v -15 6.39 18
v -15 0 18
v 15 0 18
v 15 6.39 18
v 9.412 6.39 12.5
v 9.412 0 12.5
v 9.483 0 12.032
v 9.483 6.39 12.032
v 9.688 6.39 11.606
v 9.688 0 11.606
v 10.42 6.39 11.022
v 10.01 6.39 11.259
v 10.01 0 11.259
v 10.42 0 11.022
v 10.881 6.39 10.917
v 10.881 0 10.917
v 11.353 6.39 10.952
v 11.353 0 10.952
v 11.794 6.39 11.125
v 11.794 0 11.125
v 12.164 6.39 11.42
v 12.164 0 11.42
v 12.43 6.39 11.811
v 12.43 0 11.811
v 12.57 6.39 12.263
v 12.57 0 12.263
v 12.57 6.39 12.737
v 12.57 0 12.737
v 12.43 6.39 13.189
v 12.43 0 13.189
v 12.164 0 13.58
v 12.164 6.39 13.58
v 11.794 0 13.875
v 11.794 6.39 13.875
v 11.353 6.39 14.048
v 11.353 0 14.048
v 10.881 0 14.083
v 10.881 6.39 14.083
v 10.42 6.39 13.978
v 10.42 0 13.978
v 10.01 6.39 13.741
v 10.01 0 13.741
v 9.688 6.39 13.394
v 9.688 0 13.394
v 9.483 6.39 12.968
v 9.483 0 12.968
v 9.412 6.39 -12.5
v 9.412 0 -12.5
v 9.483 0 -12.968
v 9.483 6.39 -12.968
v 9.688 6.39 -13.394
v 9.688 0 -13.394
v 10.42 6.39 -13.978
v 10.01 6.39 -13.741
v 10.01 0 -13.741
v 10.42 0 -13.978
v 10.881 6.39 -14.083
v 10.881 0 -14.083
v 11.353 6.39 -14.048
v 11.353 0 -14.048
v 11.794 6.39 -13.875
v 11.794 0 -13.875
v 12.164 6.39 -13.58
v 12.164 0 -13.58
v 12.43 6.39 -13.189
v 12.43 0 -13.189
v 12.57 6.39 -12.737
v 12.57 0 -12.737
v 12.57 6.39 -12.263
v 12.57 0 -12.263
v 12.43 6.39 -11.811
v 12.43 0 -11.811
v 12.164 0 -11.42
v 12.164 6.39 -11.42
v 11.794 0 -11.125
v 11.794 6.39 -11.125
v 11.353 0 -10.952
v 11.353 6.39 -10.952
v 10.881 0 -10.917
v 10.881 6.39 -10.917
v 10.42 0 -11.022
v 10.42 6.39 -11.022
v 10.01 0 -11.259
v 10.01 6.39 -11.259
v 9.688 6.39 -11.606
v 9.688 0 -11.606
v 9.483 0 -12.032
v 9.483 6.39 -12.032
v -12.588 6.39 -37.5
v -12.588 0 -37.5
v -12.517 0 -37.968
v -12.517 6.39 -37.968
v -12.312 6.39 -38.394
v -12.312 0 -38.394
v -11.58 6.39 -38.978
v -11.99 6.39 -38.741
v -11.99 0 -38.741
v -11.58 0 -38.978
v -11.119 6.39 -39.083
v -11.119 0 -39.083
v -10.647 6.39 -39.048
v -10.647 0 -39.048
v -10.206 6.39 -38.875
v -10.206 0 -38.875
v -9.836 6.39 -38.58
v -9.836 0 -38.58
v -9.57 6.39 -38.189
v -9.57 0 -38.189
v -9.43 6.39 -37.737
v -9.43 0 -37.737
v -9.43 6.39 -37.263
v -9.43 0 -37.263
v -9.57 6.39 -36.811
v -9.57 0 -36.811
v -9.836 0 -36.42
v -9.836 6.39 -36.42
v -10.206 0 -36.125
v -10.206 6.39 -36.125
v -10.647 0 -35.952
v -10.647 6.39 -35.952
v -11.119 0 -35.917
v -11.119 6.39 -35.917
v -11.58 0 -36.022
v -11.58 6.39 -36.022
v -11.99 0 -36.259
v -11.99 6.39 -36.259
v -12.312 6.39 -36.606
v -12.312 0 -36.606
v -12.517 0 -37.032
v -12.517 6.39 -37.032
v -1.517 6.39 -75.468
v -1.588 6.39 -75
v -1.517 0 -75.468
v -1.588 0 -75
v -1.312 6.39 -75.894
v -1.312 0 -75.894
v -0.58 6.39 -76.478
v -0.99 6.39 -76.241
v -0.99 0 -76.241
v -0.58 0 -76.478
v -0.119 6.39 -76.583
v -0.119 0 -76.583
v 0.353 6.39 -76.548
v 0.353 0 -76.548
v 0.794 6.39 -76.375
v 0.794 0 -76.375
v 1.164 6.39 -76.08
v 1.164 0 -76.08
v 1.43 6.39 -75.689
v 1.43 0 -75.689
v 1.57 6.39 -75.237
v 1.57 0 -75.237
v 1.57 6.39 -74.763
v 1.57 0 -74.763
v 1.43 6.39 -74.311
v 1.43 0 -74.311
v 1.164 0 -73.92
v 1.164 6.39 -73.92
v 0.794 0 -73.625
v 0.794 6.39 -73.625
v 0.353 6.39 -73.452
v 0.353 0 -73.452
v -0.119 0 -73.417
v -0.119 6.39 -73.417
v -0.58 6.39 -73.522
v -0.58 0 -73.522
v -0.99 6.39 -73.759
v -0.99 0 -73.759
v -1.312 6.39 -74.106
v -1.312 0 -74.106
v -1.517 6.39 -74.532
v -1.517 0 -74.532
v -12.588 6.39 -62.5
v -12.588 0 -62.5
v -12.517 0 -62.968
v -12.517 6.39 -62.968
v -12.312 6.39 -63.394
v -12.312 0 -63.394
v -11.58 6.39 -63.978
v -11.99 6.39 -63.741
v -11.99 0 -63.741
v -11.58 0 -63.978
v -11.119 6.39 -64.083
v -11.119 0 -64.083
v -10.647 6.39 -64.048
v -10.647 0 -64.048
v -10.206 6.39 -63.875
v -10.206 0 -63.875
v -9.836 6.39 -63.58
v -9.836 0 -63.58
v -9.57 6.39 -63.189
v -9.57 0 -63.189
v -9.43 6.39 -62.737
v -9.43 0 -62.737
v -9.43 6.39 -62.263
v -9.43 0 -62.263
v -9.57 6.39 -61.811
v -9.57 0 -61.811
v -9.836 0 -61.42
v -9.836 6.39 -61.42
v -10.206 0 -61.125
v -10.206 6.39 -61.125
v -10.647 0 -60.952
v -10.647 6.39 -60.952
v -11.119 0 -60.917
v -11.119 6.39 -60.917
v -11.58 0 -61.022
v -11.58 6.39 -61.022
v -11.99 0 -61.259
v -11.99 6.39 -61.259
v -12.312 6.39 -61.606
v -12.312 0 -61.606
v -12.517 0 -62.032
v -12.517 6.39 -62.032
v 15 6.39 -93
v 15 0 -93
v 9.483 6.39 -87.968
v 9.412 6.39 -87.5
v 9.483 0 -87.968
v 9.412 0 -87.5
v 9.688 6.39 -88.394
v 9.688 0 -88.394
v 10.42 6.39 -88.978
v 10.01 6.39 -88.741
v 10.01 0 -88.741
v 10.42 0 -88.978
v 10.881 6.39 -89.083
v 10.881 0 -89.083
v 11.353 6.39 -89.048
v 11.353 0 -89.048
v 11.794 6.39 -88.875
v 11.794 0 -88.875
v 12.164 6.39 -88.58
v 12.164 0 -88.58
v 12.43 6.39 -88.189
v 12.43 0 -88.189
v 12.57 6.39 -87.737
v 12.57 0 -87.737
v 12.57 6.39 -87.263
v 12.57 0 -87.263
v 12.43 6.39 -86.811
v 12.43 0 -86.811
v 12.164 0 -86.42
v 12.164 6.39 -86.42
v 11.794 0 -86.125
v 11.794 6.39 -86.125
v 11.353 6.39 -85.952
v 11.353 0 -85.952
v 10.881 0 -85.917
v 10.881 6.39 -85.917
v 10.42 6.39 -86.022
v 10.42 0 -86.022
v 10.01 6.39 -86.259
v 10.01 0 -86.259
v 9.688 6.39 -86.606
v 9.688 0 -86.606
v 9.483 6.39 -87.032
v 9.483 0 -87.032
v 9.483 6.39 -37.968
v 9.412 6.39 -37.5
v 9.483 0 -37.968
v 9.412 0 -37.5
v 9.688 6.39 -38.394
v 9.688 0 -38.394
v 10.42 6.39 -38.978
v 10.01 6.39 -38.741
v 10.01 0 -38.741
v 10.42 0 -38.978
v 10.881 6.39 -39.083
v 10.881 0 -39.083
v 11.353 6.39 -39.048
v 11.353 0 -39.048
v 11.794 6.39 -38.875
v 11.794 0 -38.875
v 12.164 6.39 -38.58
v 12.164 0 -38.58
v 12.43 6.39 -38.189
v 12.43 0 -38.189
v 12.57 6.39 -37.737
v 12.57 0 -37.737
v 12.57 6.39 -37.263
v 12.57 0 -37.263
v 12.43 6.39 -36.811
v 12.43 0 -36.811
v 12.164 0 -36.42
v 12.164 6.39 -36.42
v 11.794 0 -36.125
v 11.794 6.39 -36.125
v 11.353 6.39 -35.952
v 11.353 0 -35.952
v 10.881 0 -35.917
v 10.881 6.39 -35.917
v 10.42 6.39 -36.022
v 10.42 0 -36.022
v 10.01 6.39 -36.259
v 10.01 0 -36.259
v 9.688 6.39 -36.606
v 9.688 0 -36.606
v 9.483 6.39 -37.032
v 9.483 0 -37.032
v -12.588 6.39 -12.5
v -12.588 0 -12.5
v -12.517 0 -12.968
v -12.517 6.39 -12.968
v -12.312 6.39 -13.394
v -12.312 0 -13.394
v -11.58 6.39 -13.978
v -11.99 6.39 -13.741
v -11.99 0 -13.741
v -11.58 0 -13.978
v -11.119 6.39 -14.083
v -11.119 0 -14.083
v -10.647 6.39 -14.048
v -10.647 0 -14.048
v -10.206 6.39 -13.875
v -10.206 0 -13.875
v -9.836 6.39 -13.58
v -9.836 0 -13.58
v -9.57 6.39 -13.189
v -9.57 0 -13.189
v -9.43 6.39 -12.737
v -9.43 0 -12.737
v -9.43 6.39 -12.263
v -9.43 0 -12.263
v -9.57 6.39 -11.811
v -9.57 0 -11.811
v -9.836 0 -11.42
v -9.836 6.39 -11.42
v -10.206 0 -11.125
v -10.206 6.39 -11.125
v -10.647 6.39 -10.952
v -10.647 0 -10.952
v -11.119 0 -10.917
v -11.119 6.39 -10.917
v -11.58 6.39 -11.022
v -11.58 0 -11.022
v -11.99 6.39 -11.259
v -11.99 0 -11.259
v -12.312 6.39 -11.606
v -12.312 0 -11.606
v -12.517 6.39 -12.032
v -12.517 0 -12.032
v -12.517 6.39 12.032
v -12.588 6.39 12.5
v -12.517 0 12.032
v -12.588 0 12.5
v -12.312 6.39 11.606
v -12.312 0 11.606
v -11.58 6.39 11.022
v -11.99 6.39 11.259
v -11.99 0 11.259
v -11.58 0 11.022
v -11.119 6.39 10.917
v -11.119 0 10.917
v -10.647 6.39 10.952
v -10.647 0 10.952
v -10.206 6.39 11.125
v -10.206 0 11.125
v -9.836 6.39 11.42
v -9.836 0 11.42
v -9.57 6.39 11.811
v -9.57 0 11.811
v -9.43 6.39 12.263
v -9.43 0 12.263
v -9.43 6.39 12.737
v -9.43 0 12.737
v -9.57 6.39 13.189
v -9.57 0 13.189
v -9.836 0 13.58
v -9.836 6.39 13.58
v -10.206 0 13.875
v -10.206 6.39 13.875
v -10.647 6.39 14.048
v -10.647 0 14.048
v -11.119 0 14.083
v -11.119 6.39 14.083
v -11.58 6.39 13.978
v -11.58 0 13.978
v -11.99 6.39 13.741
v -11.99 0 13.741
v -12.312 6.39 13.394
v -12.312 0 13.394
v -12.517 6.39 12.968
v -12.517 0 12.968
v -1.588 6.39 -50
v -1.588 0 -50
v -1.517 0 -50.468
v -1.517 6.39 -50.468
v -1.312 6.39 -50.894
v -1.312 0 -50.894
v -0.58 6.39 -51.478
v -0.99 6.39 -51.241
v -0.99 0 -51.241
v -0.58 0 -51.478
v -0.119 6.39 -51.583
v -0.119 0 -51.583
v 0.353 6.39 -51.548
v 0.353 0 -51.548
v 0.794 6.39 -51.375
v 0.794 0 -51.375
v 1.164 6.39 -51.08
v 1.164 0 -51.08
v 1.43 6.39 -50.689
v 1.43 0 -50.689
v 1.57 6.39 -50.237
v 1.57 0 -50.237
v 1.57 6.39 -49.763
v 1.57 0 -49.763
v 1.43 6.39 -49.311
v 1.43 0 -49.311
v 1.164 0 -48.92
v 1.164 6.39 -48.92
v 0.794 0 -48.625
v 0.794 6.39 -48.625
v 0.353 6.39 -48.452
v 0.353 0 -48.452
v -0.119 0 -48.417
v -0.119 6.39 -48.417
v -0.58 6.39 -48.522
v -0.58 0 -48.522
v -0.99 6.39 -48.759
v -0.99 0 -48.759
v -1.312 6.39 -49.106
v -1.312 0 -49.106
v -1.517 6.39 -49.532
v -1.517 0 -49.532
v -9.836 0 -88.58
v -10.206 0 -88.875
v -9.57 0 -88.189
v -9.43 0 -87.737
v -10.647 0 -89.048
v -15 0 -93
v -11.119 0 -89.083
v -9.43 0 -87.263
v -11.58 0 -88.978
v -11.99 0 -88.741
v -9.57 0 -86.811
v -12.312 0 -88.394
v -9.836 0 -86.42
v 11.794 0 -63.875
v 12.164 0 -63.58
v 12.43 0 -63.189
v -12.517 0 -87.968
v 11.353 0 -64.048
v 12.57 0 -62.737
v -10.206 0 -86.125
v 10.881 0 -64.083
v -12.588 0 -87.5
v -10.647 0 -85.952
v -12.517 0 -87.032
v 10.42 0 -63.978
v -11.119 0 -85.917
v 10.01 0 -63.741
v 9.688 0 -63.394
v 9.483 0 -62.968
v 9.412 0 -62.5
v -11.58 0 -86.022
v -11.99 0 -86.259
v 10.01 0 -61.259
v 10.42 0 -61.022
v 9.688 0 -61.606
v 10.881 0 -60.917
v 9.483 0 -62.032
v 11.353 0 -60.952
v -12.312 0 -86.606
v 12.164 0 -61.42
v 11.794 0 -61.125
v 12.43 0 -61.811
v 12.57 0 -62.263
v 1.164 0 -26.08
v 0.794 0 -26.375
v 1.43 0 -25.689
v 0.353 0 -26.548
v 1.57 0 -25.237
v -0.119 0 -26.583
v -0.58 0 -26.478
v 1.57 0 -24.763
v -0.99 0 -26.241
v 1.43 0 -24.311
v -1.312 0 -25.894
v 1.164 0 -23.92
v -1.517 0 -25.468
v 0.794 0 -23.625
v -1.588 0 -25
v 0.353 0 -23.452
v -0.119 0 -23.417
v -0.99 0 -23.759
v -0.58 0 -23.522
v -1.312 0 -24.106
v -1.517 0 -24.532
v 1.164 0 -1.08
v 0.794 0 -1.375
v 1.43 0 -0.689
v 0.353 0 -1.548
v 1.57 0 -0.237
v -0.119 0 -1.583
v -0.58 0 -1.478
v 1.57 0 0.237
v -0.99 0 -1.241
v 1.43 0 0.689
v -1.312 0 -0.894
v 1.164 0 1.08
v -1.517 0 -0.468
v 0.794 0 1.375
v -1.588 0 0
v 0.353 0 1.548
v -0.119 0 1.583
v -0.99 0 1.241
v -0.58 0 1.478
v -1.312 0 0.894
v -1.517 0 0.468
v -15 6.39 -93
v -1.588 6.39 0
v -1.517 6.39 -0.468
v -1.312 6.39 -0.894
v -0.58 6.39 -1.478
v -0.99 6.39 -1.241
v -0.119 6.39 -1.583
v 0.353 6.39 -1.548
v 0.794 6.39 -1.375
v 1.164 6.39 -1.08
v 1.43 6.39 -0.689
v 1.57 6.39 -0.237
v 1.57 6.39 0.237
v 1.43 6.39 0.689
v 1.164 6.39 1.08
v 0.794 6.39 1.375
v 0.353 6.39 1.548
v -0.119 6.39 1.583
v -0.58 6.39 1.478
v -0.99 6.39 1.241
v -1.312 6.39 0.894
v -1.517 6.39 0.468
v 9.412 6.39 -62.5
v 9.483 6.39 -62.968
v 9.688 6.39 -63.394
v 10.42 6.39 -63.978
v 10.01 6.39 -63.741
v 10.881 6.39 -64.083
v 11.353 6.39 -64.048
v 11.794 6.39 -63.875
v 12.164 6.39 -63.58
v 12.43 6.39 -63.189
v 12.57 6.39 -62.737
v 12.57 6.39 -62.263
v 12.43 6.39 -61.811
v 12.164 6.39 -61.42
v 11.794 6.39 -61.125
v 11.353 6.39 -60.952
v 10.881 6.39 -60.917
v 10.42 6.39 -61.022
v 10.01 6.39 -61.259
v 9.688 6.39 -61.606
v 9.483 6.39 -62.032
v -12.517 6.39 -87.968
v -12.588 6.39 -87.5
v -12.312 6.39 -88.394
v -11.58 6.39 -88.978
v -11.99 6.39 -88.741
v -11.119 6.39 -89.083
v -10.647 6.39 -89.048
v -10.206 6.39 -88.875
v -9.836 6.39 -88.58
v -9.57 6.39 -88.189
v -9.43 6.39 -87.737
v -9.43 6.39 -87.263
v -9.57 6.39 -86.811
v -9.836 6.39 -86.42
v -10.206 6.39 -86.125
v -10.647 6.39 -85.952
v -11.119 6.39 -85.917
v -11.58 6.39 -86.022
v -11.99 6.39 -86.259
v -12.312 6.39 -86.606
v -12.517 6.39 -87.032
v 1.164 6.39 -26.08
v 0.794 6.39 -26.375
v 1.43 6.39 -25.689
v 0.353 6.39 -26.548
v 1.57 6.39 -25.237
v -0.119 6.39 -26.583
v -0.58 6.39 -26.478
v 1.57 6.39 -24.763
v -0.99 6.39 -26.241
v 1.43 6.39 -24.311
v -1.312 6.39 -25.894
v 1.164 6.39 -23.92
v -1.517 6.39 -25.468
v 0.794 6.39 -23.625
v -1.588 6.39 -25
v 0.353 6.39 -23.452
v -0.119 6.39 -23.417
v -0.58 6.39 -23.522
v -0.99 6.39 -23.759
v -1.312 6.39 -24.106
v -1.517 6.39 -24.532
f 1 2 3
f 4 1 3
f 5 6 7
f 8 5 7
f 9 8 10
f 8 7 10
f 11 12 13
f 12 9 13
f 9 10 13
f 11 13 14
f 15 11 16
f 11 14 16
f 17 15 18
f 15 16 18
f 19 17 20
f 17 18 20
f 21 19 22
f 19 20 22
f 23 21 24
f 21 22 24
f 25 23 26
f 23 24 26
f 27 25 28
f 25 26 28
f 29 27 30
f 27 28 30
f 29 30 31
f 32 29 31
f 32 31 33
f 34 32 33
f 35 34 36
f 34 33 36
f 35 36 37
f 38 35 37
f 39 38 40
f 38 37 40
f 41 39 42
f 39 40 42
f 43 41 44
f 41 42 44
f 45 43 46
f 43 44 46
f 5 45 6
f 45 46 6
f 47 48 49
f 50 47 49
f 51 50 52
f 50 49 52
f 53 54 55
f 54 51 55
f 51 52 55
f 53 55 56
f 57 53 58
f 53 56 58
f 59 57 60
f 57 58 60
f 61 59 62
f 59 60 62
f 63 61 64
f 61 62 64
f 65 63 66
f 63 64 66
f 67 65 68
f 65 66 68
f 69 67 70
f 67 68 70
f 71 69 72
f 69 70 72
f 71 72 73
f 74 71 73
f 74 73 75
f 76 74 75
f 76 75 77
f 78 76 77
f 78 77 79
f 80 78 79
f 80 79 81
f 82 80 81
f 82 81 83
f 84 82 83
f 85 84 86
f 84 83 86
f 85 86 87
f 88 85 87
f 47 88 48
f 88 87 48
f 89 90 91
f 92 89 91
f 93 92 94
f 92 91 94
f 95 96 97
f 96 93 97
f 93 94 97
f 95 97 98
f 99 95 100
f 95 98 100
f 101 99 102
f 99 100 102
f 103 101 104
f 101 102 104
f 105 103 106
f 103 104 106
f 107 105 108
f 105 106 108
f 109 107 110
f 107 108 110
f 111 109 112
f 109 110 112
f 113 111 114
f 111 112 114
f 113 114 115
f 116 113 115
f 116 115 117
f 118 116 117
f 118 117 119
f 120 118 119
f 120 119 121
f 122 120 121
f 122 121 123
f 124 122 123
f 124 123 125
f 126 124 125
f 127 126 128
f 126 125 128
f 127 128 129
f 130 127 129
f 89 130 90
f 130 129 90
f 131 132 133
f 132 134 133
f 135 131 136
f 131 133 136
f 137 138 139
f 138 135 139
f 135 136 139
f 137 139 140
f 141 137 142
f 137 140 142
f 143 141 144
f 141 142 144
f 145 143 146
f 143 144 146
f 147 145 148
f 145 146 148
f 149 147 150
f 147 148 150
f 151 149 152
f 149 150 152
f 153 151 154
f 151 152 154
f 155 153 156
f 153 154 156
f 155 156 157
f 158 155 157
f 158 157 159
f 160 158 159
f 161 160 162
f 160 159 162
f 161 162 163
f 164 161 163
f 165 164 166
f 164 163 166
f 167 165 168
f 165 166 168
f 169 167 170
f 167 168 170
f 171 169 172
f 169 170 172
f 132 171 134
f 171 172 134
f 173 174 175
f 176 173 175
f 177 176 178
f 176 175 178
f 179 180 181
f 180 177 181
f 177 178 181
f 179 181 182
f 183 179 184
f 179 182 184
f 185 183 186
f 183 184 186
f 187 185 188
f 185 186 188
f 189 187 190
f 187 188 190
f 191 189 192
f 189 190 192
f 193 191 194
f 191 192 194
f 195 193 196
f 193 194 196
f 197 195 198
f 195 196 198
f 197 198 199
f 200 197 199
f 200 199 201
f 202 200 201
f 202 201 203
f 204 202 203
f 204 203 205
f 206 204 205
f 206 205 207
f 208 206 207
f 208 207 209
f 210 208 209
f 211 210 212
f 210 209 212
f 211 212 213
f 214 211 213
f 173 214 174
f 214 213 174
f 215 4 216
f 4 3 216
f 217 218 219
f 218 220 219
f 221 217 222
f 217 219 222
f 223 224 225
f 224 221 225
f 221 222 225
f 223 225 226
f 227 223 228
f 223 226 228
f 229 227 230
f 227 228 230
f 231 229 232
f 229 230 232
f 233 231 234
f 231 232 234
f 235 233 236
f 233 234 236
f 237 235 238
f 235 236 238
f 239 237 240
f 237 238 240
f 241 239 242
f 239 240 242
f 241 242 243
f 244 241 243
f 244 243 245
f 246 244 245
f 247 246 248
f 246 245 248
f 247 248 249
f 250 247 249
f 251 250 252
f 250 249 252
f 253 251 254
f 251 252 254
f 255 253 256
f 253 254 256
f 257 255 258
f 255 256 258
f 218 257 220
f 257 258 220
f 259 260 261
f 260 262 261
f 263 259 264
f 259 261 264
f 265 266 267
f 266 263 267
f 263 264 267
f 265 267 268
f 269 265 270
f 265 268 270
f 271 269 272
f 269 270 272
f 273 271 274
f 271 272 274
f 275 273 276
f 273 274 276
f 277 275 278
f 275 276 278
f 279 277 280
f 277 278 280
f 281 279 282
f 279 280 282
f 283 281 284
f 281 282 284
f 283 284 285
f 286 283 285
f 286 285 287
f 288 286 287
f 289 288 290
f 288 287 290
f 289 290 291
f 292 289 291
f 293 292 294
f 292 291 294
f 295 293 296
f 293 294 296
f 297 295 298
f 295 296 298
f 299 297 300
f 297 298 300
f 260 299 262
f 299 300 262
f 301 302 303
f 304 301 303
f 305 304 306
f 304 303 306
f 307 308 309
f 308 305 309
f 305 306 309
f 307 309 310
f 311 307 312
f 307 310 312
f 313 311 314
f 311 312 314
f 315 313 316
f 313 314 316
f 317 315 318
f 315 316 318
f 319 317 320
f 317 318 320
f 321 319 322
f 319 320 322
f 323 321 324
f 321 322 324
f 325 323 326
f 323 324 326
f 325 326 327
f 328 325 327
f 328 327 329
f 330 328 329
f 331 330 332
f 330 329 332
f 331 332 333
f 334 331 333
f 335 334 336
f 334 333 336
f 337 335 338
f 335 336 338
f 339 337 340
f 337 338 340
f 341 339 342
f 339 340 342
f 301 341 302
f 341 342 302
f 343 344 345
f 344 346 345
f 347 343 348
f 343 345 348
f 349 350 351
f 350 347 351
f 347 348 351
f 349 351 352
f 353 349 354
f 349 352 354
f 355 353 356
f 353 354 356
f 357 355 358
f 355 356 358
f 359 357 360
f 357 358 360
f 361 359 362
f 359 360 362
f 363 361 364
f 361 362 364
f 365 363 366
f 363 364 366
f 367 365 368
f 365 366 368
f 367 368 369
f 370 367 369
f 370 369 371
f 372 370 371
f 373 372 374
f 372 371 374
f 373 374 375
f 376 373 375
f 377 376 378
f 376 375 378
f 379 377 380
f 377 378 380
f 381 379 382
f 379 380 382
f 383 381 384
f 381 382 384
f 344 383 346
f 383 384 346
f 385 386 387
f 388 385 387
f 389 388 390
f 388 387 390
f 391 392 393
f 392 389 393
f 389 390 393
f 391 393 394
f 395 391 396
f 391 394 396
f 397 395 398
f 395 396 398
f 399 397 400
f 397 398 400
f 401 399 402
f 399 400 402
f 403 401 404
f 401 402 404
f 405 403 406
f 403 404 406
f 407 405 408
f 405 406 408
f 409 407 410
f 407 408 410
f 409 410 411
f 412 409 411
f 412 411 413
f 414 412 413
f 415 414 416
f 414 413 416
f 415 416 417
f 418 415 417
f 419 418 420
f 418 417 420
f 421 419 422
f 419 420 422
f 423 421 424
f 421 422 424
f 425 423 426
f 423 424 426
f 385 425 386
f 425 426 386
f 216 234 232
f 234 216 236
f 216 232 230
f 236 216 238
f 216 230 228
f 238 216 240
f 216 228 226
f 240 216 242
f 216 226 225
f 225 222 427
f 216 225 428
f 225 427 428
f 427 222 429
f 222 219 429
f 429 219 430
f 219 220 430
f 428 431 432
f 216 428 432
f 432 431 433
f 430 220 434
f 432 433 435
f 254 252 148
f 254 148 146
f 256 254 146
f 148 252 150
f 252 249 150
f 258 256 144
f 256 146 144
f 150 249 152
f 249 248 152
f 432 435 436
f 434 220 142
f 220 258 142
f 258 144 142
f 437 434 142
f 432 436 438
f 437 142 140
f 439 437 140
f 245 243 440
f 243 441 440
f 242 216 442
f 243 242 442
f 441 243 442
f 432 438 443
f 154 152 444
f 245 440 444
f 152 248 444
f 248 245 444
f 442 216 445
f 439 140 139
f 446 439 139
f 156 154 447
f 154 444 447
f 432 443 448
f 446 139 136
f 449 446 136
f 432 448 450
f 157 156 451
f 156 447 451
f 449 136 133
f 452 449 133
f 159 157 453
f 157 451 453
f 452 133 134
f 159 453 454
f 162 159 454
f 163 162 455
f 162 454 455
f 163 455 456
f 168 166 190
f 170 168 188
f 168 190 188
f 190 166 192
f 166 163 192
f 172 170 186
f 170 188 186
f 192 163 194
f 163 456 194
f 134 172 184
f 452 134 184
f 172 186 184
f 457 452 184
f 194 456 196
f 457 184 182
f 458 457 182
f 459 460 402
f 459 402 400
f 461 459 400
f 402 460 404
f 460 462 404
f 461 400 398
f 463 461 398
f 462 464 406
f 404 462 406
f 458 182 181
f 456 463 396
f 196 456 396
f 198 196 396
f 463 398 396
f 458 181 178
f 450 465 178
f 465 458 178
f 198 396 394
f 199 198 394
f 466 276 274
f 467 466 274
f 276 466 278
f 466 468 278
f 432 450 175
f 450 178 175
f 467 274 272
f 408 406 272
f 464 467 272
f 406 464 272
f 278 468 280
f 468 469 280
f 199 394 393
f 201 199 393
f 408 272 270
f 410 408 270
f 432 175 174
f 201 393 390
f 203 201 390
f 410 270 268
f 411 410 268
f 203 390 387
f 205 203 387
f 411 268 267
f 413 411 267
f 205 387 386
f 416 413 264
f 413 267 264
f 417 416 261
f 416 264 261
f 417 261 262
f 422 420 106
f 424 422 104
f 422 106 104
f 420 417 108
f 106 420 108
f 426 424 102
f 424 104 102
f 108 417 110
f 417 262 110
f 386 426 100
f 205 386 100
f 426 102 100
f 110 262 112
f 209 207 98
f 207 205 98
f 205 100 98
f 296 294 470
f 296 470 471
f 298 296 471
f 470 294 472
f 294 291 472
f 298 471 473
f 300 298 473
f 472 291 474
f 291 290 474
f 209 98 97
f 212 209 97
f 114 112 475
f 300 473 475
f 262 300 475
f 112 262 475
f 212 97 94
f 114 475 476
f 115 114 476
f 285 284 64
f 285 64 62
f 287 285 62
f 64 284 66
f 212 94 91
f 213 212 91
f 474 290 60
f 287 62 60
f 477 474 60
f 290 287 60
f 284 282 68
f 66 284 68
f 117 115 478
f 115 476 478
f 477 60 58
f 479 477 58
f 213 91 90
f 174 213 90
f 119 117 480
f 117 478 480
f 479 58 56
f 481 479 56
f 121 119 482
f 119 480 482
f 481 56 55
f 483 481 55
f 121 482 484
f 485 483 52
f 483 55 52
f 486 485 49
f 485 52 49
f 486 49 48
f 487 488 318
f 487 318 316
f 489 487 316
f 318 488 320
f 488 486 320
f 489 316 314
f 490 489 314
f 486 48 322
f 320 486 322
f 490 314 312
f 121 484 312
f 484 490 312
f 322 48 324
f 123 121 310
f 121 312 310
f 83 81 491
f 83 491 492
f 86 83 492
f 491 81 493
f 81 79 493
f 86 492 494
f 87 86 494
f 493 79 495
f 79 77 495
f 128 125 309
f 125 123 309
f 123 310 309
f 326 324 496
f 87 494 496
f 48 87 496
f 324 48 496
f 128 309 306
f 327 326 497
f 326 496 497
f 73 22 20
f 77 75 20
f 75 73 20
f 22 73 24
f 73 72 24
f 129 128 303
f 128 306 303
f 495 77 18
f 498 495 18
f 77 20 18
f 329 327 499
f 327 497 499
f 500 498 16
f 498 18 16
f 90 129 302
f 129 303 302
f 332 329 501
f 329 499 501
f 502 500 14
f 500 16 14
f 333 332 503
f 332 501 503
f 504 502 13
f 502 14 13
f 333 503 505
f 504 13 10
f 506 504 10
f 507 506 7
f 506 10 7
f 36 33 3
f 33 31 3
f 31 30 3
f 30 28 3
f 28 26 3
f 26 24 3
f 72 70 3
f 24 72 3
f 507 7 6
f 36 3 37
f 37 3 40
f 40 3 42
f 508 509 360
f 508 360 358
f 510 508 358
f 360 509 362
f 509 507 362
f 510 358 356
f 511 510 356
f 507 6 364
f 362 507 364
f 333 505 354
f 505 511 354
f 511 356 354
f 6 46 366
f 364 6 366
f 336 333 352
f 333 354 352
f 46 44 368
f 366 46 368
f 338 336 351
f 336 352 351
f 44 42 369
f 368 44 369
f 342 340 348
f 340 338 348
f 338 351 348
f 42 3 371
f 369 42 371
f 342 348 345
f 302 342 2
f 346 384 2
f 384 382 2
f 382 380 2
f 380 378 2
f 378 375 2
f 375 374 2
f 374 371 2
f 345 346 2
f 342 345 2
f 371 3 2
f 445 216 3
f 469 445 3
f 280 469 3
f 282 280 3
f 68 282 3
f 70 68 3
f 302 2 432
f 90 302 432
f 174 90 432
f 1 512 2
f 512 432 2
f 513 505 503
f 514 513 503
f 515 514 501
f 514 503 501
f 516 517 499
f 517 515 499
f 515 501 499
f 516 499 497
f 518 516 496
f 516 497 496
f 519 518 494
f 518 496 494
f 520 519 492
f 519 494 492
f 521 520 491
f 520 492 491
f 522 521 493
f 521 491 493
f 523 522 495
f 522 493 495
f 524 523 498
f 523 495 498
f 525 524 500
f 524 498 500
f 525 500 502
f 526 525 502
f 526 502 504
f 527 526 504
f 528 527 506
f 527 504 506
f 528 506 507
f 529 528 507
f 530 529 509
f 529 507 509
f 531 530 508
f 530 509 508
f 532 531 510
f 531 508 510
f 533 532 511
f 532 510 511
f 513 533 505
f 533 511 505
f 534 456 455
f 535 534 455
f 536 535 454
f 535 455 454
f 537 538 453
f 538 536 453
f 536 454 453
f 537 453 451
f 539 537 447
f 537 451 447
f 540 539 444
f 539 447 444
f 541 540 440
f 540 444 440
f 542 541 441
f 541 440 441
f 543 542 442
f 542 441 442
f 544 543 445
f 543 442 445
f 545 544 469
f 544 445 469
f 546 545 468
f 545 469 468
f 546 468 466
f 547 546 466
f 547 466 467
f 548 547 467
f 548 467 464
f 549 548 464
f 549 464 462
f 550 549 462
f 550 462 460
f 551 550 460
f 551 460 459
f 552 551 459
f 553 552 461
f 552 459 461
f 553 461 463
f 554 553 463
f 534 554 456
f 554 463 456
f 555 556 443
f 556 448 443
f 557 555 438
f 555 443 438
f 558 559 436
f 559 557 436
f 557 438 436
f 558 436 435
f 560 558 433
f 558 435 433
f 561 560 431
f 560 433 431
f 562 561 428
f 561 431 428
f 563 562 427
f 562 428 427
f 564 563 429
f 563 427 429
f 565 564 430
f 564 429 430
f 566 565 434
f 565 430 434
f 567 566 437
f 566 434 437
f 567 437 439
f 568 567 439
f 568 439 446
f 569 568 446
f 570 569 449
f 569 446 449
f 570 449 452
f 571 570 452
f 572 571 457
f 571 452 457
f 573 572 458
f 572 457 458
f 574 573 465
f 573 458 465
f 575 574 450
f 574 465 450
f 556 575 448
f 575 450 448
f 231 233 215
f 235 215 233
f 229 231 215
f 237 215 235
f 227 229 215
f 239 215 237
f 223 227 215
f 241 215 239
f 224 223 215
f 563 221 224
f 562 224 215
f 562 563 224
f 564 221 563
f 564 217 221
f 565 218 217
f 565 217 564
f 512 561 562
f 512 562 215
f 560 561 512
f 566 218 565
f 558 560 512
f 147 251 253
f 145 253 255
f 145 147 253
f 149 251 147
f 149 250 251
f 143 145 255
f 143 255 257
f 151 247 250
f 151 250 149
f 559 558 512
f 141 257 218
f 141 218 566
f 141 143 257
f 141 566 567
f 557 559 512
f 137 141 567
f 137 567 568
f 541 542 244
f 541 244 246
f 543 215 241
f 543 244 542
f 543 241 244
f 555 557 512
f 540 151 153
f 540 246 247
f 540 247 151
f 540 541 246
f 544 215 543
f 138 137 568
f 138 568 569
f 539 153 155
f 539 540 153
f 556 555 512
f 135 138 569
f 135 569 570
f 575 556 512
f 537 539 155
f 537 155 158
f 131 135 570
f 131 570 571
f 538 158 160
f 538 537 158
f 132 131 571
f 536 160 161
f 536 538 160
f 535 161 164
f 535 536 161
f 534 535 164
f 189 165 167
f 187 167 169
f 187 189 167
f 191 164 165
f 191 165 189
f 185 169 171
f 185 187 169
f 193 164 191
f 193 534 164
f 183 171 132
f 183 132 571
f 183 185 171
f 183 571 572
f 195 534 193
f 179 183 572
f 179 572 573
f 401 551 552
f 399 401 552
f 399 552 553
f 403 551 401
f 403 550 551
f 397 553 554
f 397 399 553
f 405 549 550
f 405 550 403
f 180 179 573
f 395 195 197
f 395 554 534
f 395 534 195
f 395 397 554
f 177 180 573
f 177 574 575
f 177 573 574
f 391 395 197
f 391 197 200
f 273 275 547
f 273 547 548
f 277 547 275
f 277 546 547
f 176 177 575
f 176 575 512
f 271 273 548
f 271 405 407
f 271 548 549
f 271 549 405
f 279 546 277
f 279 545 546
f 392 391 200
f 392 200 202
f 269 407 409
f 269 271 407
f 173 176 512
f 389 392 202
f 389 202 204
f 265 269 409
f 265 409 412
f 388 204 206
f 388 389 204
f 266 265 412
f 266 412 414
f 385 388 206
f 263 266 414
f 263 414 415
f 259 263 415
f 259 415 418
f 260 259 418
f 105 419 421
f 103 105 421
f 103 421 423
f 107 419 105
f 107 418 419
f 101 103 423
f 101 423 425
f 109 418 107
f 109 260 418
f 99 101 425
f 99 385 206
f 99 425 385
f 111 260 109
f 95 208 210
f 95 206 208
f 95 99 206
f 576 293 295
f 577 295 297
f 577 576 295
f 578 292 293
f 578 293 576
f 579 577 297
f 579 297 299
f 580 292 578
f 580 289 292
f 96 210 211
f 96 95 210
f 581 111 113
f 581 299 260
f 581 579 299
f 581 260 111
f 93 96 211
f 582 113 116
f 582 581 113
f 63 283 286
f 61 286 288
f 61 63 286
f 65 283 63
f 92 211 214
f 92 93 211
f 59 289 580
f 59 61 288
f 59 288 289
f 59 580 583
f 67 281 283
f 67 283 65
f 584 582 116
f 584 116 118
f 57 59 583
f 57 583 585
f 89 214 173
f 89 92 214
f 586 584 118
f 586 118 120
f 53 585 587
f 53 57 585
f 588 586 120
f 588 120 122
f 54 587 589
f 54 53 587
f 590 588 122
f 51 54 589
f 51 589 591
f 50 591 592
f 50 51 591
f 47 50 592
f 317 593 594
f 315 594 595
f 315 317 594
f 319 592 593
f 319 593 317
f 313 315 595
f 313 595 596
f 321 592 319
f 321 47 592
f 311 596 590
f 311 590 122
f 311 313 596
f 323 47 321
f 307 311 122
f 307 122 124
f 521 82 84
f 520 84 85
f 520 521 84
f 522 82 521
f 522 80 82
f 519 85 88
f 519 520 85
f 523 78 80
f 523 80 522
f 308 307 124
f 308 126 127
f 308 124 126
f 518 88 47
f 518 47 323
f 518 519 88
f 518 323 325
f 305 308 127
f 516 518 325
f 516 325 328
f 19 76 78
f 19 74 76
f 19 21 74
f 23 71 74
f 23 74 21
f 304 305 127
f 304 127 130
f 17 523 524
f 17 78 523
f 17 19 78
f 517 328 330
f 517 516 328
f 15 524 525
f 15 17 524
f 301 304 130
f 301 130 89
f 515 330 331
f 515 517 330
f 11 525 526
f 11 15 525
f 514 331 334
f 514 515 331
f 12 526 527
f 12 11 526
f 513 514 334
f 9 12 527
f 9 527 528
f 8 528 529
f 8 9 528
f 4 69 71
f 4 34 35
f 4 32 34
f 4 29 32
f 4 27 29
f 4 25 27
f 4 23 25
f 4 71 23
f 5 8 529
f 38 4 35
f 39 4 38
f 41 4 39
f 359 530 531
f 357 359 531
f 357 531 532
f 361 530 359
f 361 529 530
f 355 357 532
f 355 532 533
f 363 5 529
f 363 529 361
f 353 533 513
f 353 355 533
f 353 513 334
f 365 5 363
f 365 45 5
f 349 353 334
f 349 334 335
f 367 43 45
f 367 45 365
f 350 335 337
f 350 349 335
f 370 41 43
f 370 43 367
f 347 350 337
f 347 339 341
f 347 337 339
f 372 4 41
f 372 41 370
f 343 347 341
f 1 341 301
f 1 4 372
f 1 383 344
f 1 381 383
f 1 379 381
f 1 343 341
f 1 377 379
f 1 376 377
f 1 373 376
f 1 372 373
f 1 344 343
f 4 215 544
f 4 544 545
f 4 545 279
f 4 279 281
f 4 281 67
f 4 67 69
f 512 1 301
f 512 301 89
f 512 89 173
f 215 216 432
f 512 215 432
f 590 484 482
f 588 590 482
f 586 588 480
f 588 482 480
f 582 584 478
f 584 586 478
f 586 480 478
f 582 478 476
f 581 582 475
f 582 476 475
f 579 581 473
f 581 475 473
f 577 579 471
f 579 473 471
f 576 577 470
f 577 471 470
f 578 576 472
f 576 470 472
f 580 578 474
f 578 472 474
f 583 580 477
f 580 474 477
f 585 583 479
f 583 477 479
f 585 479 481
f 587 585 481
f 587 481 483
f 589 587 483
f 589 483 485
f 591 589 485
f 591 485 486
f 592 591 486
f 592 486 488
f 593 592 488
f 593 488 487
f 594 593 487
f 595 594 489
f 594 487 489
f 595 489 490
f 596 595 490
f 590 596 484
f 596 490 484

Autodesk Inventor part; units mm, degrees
ref_plane "YZ Plane" through (0, 0, 0) normal (1, 0, 0) x (0, 1, 0)
ref_plane "XZ Plane" through (0, 0, 0) normal (0, 1, 0) x (-1, 0, 0)
ref_plane "XY Plane" through (0, 0, 0) normal (0, 0, 1) x (1, 0, 0)
sketch "Sketch1" plane through (0, 0, 0) normal (0, 1, 0) x (-1, 0, 0)
  circle A0 centre (0, 0) radius 10.45 construction
  circle A1 centre (0, 0) radius 1.5875
  circle A2 centre (0, -25) radius 9.9 construction
  circle A3 centre (0, -25) radius 1.5875
  circle A4 centre (0, -50) radius 9.57 construction
  circle A5 centre (0, -50) radius 1.5875
  circle A6 centre (0, -75) radius 9.35 construction
  circle A7 centre (0, -75) radius 1.5875
  line L0 (15, 18) -> (-15, 18)
  line L1 (-15, 18) -> (-15, -93)
  line L2 (-15, -93) -> (15, -93)
  line L3 (15, -93) -> (15, 18)
  circle A8 centre (0, 0) radius 11.45 construction
  circle A9 centre (0, -25) radius 10.9 construction
  circle A10 centre (0, -50) radius 10.57 construction
  circle A11 centre (0, -75) radius 10.35 construction
  circle A12 centre (11, -12.5) radius 1.5875
  line L4 (0, 0) -> (0, -25) construction
  line L5 (0, 0) -> (-15, 0) construction
  line L6 (0, -25) -> (-15, -25) construction
  line L7 (0, -50) -> (-15, -50) construction
  line L8 (0, -75) -> (-15, -75) construction
  circle A13 centre (-11, -12.5) radius 1.5875
  circle A14 centre (11, 12.5) radius 1.5875
  circle A15 centre (-11, 12.5) radius 1.5875
  circle A16 centre (11, -37.5) radius 1.5875
  circle A17 centre (-11, -37.5) radius 1.5875
  circle A18 centre (11, -62.5) radius 1.5875
  circle A19 centre (-11, -62.5) radius 1.5875
  circle A20 centre (11, -87.5) radius 1.5875
  circle A21 centre (-11, -87.5) radius 1.5875
  point P0 (0, -12.5)
  dimension "d0" = 20.9
  dimension "d1" = 3.175
  dimension "d2" = 19.8
  dimension "d3" = 3.175
  dimension "d4" = 19.14
  dimension "d5" = 3.175
  dimension "d6" = 18.7
  dimension "d7" = 3.175
  dimension "d8" = 25
  dimension "d9" = 25
  dimension "d10" = 25
  dimension "d11" = 15
  dimension "d12" = 15
  dimension "d13" = 18
  dimension "d14" = 18
  dimension "d15" = 1
  dimension "d16" = 1
  dimension "d17" = 1
  dimension "d18" = 1
  dimension "d19" = 3.175
  dimension "d20" = 4
extrude "Extrusion2" add sketch "Sketch1" along normal blind 6.39
equation "\"d23\" = WoodThickness"
equation "\"WoodThickness\" = 6.39"
properties part number "BearingSilicone_Base"
